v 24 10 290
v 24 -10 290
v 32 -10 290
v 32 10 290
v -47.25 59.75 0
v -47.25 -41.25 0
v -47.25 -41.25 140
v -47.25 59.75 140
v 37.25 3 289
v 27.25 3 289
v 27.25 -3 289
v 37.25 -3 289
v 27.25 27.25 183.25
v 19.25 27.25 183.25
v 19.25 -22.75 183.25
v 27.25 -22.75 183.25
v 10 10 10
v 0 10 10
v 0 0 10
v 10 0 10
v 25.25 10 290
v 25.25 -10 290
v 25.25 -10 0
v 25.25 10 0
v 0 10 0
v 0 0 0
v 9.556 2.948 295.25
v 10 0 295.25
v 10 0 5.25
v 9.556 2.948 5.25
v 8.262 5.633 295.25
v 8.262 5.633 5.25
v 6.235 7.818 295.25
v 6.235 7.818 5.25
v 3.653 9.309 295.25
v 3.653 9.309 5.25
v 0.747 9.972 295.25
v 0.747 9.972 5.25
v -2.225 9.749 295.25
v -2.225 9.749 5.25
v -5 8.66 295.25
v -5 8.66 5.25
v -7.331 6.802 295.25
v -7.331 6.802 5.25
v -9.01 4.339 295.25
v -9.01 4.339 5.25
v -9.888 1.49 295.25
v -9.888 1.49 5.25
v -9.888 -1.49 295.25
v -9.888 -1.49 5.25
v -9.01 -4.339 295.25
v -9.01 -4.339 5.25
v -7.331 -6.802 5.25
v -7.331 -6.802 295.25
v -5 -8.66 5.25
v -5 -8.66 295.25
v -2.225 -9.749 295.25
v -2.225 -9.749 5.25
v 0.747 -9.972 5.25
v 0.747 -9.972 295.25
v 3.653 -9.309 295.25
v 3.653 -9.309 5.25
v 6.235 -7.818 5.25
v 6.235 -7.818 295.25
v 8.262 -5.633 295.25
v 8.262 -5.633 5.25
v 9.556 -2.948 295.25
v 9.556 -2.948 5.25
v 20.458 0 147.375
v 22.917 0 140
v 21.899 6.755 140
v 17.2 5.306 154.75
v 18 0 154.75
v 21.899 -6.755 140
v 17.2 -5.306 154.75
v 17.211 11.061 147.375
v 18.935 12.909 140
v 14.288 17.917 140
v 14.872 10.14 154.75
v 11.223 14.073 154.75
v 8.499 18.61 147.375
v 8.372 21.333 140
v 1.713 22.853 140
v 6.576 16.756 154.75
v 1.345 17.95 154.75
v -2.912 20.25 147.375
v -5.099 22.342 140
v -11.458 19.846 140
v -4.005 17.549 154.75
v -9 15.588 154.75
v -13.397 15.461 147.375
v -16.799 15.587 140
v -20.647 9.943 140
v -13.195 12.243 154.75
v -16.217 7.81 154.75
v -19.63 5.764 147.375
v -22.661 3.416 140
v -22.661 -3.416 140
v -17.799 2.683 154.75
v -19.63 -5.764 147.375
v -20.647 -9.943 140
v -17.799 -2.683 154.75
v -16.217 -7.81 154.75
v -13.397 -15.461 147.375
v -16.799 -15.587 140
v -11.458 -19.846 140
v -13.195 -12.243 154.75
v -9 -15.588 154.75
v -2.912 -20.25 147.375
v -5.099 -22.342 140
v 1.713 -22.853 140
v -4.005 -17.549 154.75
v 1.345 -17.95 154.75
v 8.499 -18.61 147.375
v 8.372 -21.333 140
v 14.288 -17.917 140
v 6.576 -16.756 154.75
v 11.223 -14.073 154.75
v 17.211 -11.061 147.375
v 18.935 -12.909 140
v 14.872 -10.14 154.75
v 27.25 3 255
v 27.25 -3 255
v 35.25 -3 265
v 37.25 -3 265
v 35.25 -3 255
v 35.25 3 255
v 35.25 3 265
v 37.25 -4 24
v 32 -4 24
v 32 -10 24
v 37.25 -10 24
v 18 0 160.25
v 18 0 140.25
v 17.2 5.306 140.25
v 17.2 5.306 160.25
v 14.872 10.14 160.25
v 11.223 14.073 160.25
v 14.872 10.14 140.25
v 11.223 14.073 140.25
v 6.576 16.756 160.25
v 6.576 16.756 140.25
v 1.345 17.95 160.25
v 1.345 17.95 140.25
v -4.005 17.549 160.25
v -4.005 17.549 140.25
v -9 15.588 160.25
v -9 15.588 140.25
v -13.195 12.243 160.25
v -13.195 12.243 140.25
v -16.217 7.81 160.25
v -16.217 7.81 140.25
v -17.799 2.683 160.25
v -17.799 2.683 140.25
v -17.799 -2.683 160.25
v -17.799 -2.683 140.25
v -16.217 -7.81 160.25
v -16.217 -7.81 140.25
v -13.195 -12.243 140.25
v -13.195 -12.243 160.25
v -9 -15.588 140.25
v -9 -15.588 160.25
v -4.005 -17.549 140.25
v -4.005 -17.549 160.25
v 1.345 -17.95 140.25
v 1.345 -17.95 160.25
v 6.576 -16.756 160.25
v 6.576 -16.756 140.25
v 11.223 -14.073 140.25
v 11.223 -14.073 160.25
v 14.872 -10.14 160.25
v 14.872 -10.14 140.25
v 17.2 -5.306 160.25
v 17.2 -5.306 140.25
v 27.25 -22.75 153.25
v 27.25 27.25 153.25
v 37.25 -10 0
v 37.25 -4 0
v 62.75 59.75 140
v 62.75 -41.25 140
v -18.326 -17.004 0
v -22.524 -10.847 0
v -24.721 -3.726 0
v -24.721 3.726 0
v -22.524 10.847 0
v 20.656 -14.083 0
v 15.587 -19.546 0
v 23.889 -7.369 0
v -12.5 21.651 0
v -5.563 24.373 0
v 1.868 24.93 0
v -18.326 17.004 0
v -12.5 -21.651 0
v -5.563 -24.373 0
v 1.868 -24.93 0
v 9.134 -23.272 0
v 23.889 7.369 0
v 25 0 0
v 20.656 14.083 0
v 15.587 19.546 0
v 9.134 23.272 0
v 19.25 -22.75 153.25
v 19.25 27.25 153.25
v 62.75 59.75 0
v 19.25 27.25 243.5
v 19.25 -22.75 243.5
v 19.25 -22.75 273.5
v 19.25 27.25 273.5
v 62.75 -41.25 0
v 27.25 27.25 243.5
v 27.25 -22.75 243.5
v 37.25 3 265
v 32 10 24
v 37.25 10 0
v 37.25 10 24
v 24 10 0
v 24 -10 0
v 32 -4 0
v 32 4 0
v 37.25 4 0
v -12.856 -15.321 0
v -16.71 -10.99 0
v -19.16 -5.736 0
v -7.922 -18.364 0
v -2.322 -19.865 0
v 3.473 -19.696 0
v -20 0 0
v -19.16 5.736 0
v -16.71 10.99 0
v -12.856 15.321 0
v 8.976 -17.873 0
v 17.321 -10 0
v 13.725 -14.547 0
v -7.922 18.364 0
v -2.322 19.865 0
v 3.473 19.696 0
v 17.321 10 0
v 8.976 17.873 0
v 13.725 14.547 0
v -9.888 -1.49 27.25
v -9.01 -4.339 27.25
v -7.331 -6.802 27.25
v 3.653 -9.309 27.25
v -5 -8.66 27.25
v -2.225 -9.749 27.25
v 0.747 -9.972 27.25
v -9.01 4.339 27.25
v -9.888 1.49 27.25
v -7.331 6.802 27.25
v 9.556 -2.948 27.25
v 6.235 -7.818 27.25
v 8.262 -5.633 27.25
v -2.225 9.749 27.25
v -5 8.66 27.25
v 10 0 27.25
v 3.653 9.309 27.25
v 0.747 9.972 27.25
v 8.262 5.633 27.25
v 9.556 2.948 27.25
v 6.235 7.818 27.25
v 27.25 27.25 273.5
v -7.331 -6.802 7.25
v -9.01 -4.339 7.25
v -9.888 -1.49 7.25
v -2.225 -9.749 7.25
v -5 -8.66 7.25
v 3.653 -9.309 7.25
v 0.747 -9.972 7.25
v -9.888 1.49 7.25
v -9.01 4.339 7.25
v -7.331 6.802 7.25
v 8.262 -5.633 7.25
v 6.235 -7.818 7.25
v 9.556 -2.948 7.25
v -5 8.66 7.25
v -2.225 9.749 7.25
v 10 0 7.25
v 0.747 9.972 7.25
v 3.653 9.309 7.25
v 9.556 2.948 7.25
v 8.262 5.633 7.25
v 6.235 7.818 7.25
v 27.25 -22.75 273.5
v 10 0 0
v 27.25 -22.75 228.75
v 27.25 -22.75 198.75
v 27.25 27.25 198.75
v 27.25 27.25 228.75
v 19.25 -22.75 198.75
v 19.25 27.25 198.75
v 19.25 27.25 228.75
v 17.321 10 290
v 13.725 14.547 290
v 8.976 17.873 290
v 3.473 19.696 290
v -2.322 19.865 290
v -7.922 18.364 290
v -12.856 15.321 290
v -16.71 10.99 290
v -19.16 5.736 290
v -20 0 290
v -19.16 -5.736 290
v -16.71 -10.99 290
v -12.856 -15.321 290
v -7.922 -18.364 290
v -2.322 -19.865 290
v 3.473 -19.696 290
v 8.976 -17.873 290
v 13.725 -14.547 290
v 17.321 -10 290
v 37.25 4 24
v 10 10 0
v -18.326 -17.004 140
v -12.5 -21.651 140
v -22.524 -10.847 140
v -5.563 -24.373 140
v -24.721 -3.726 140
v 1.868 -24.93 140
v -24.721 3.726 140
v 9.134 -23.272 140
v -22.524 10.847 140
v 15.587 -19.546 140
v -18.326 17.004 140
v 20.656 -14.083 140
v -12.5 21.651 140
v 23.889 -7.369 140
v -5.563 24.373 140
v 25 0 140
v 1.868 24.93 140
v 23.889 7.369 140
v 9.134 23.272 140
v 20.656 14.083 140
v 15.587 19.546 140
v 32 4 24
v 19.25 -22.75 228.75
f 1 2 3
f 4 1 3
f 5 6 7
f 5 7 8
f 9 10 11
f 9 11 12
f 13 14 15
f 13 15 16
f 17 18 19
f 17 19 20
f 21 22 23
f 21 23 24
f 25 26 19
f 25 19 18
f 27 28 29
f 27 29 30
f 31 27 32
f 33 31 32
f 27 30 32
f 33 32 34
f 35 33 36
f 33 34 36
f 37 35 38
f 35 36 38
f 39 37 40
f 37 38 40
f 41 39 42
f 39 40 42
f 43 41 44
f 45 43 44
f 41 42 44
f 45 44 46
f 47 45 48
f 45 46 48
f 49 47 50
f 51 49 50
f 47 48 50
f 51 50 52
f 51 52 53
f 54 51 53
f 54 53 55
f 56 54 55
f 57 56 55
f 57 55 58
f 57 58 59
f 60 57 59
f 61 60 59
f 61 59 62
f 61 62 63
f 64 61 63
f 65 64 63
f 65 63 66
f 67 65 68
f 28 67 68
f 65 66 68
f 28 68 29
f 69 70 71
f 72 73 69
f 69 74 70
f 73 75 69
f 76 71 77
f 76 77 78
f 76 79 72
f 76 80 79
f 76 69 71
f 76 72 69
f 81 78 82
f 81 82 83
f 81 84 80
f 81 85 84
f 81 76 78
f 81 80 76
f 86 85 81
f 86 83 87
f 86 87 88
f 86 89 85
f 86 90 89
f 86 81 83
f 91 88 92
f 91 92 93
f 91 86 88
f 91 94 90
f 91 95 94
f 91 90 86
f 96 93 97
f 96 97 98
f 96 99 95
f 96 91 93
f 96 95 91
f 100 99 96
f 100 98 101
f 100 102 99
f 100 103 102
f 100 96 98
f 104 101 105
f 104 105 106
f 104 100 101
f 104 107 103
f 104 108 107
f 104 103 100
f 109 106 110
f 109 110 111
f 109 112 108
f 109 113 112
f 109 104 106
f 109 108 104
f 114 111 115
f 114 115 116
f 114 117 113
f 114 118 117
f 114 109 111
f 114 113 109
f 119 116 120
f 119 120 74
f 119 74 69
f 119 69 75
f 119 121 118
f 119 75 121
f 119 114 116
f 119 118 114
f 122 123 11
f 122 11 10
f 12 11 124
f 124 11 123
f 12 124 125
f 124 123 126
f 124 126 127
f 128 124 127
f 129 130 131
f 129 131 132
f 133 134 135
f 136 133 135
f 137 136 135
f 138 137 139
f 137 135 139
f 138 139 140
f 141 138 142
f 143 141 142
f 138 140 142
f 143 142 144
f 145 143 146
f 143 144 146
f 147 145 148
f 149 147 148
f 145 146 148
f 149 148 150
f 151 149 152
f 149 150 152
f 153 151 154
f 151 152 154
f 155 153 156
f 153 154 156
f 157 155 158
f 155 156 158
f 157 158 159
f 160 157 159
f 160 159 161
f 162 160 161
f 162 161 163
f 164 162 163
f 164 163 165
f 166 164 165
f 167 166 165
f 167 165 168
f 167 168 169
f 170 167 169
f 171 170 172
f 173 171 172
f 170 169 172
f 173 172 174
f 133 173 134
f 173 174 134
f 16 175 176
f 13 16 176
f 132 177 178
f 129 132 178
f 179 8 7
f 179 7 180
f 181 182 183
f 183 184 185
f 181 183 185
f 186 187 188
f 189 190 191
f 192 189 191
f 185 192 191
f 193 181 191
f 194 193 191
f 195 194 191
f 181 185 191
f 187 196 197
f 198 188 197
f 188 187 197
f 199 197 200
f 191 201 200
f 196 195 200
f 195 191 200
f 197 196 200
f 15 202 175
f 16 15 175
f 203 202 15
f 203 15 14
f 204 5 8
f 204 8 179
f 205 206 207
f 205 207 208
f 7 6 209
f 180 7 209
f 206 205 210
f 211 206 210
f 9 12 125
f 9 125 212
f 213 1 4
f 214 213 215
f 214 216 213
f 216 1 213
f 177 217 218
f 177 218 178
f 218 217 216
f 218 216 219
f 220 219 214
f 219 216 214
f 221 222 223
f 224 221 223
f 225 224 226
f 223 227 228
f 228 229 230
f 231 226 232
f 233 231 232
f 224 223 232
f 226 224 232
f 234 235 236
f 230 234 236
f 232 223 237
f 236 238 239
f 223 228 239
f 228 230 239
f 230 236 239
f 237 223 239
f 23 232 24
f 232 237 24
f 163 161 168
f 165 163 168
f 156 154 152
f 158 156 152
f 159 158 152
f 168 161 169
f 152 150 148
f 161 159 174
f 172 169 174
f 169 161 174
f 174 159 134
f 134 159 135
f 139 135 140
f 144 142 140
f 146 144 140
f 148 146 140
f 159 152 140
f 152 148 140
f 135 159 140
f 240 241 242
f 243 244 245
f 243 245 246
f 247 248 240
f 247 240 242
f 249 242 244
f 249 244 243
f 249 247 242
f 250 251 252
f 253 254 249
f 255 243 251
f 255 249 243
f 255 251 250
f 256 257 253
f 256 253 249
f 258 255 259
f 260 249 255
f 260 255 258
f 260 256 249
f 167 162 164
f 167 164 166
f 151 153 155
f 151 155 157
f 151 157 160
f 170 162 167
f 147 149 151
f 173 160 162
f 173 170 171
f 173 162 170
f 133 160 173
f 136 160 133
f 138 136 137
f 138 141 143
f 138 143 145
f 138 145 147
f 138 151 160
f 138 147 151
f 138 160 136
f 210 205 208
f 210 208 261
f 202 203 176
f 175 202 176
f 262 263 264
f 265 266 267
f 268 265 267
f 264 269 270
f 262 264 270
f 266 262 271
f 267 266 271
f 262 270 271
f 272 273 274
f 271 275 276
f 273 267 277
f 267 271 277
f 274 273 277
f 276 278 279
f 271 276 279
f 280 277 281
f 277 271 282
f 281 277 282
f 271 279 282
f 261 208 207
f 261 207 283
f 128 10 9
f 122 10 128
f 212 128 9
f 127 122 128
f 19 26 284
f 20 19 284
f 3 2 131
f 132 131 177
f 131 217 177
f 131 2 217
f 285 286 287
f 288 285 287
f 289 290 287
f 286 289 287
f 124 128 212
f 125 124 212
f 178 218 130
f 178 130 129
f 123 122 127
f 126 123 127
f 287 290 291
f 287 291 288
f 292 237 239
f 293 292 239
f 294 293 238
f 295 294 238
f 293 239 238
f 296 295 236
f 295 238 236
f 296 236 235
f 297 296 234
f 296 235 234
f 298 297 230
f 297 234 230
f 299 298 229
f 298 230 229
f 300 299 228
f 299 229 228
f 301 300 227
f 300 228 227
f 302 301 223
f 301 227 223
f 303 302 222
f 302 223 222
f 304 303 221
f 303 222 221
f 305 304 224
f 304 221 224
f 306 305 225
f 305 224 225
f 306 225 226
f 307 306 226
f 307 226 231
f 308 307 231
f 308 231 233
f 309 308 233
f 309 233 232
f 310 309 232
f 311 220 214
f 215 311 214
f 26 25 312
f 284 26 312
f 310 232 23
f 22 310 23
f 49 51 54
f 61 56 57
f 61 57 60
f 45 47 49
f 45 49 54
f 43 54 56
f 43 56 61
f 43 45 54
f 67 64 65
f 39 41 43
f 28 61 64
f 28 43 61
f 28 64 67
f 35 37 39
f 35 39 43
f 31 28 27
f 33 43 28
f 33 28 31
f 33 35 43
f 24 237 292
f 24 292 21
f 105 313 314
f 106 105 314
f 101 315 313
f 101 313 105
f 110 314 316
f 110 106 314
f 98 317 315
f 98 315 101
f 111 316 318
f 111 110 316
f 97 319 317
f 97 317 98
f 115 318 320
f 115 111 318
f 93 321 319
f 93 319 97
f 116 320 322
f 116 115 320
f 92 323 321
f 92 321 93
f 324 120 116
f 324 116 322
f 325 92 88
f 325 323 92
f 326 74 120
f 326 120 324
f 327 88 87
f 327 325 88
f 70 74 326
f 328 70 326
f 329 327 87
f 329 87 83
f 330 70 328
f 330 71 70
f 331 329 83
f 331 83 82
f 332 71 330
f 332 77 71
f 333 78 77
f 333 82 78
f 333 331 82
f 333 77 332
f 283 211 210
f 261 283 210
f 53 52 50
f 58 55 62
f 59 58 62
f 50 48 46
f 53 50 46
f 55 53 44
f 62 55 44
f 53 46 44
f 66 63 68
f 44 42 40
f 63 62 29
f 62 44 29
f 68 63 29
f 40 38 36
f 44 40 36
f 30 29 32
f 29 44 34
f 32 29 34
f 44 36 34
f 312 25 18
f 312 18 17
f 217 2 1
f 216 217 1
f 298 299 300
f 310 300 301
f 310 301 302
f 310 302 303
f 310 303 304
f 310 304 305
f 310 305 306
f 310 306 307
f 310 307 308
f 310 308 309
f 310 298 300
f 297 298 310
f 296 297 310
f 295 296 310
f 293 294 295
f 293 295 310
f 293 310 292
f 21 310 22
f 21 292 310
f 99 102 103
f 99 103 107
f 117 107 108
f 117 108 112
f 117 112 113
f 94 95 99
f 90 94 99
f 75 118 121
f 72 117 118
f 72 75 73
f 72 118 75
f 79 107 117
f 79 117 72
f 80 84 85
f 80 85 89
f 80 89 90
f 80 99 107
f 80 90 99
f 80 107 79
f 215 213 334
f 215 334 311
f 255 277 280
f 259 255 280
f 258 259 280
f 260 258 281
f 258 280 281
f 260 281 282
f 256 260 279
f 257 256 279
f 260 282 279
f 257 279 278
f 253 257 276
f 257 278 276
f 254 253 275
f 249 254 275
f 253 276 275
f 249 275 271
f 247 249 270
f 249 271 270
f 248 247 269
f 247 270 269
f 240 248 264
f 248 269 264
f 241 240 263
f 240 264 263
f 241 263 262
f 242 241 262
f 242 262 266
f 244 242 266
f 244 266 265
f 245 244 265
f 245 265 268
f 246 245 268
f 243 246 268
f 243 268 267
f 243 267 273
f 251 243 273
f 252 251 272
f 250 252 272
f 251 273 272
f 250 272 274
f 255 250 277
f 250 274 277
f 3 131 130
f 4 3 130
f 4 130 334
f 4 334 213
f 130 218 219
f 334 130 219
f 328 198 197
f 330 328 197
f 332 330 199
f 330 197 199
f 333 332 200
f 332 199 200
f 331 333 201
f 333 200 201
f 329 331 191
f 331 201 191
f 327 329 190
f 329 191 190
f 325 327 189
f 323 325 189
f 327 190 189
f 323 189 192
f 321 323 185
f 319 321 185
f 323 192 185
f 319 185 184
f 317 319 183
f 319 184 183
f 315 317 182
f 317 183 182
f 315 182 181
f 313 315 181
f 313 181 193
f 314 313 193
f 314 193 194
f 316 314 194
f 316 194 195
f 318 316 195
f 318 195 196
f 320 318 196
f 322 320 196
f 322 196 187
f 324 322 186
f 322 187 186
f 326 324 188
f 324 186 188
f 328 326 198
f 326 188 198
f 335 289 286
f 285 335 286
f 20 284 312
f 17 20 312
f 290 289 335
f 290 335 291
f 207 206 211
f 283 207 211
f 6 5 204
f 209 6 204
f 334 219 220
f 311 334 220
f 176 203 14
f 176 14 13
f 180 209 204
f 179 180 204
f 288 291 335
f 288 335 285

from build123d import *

# Parameters (mm, degrees)
BOX_W             = 8
BOX_H             = 20
BOX_DEPTH         = 290
CYLINDER_R        = 20
CYLINDER_DEPTH    = 290
CYLINDER001_R     = 25
CYLINDER001_DEPTH = 140
BOX005_W          = 8
BOX005_H          = 6
BOX005_DEPTH      = 34
BOX004_W          = 10
BOX004_H          = 6
BOX004_DEPTH      = 24
BOX002_W          = 10
BOX002_H          = 6
BOX002_DEPTH      = 24
BOX001_W          = 8
BOX001_H          = 20
BOX001_DEPTH      = 290
BOX003_W          = 10
BOX003_H          = 6
BOX003_DEPTH      = 24
BOX006_W          = 8
BOX006_H          = 50
BOX006_DEPTH      = 30
BOX007_W          = 8
BOX007_H          = 50
BOX007_DEPTH      = 30
BOX008_W          = 8
BOX008_H          = 50
BOX008_DEPTH      = 30
CYLINDER002_R     = 10
CYLINDER002_DEPTH = 20
CYLINDER003_R     = 10
CYLINDER003_DEPTH = 290
BOX009_W          = 10
BOX009_H          = 10
BOX009_DEPTH      = 10
BOX010_W          = 110
BOX010_H          = 101
BOX010_DEPTH      = 140
CYLINDER004_R     = 18
CYLINDER004_DEPTH = 20


with BuildPart() as cube:
    # Box → Box (new body)
    with BuildSketch(Plane(origin=(17.25, -10, 0), x_dir=(1, 0, 0), z_dir=(0, 0, 1))):
        with Locations((4, 10)):
            Rectangle(BOX_W, BOX_H)
    extrude(amount=BOX_DEPTH)


with BuildPart() as mainbarrel:
    # Cylinder → Cylinder (new body)
    with BuildSketch(Plane.XY):
        Circle(CYLINDER_R)
    extrude(amount=CYLINDER_DEPTH)

    # Fusion: union Cube
    add(cube.part)


with BuildPart() as cylinder001:
    # Cylinder001 → Cylinder001 (new body)
    with BuildSketch(Plane.XY):
        Circle(CYLINDER001_R)
    extrude(amount=CYLINDER001_DEPTH)


with BuildPart() as rearbarrel:
    # Cone → Cone (revolve)
    with BuildSketch(Plane(origin=(0, 0, 139.75), x_dir=(1, 0, 0), z_dir=(0, -1, 0))):
        Polygon((0, 0), (23, 0), (18, 15), (0, 15), align=None)
    revolve(axis=Axis((0, 0, 139.75), (0, 0, 1)))

    # Fusion001: union Cylinder001
    add(cylinder001.part)


with BuildPart() as cube005:
    # Box005 → Box005 (new body)
    with BuildSketch(Plane(origin=(27.25, -3, 0), x_dir=(1, 0, 0), z_dir=(0, 0, 1))):
        with Locations((4, 3)):
            Rectangle(BOX005_W, BOX005_H)
    extrude(amount=BOX005_DEPTH)


with BuildPart() as frontsight:
    # Box004 → Box004 (new body)
    with BuildSketch(Plane(origin=(27.25, -3, 10), x_dir=(1, 0, 0), z_dir=(0, 0, 1))):
        with Locations((5, 3)):
            Rectangle(BOX004_W, BOX004_H)
    extrude(amount=BOX004_DEPTH)

    # Fusion002: union Cube005
    add(cube005.part)


with BuildPart() as frontsight_1:
    # Fusion002 placement: moved
    add(frontsight.part.moved(Location((0, 0, 255))))


with BuildPart() as cube002:
    # Box002 → Box002 (new body)
    with BuildSketch(Plane(origin=(27.25, -10, 0), x_dir=(1, 0, 0), z_dir=(0, 0, 1))):
        with Locations((5, 3)):
            Rectangle(BOX002_W, BOX002_H)
    extrude(amount=BOX002_DEPTH)


with BuildPart() as cube001:
    # Box001 → Box001 (new body)
    with BuildSketch(Plane(origin=(24, -10, 0), x_dir=(1, 0, 0), z_dir=(0, 0, 1))):
        with Locations((4, 10)):
            Rectangle(BOX001_W, BOX001_H)
    extrude(amount=BOX001_DEPTH)


with BuildPart() as rearsight:
    # Box003 → Box003 (new body)
    with BuildSketch(Plane(origin=(27.25, 4, 0), x_dir=(1, 0, 0), z_dir=(0, 0, 1))):
        with Locations((5, 3)):
            Rectangle(BOX003_W, BOX003_H)
    extrude(amount=BOX003_DEPTH)

    # Fusion003: union Cube001
    add(cube001.part)

    # Fusion004: union Cube002
    add(cube002.part)


with BuildPart() as cube006:
    # Box006 → Box006 (new body)
    with BuildSketch(Plane(origin=(19.25, -22.75, 153.25), x_dir=(1, 0, 0), z_dir=(0, 0, 1))):
        with Locations((4, 25)):
            Rectangle(BOX006_W, BOX006_H)
    extrude(amount=BOX006_DEPTH)


with BuildPart() as cube007:
    # Box007 → Box007 (new body)
    with BuildSketch(Plane(origin=(19.25, -22.75, 198.75), x_dir=(1, 0, 0), z_dir=(0, 0, 1))):
        with Locations((4, 25)):
            Rectangle(BOX007_W, BOX007_H)
    extrude(amount=BOX007_DEPTH)


with BuildPart() as cube008:
    # Box008 → Box008 (new body)
    with BuildSketch(Plane(origin=(19.25, -22.75, 243.5), x_dir=(1, 0, 0), z_dir=(0, 0, 1))):
        with Locations((4, 25)):
            Rectangle(BOX008_W, BOX008_H)
    extrude(amount=BOX008_DEPTH)


with BuildPart() as cylinder002:
    # Cylinder002 → Cylinder002 (new body)
    with BuildSketch(Plane.XY.offset(7.25)):
        Circle(CYLINDER002_R)
    extrude(amount=CYLINDER002_DEPTH)


with BuildPart() as cylinder003:
    # Cylinder003 → Cylinder003 (new body)
    with BuildSketch(Plane.XY.offset(5.25)):
        Circle(CYLINDER003_R)
    extrude(amount=CYLINDER003_DEPTH)


with BuildPart() as cube009:
    # Box009 → Box009 (new body)
    with BuildSketch(Plane.XY):
        with Locations((5, 5)):
            Rectangle(BOX009_W, BOX009_H)
    extrude(amount=BOX009_DEPTH)


with BuildPart() as cube010:
    # Box010 → Box010 (new body)
    with BuildSketch(Plane(origin=(-47.25, -41.25, 0), x_dir=(1, 0, 0), z_dir=(0, 0, 1))):
        with Locations((55, 50.5)):
            Rectangle(BOX010_W, BOX010_H)
    extrude(amount=BOX010_DEPTH)


with BuildPart() as cylinder004:
    # Cylinder004 → Cylinder004 (new body)
    with BuildSketch(Plane.XY.offset(140.25)):
        Circle(CYLINDER004_R)
    extrude(amount=CYLINDER004_DEPTH)


solid = Compound([mainbarrel.part, rearbarrel.part, frontsight_1.part, rearsight.part, cube006.part, cube007.part, cube008.part, cylinder002.part, cylinder003.part, cube009.part, cube010.part, cylinder004.part])
